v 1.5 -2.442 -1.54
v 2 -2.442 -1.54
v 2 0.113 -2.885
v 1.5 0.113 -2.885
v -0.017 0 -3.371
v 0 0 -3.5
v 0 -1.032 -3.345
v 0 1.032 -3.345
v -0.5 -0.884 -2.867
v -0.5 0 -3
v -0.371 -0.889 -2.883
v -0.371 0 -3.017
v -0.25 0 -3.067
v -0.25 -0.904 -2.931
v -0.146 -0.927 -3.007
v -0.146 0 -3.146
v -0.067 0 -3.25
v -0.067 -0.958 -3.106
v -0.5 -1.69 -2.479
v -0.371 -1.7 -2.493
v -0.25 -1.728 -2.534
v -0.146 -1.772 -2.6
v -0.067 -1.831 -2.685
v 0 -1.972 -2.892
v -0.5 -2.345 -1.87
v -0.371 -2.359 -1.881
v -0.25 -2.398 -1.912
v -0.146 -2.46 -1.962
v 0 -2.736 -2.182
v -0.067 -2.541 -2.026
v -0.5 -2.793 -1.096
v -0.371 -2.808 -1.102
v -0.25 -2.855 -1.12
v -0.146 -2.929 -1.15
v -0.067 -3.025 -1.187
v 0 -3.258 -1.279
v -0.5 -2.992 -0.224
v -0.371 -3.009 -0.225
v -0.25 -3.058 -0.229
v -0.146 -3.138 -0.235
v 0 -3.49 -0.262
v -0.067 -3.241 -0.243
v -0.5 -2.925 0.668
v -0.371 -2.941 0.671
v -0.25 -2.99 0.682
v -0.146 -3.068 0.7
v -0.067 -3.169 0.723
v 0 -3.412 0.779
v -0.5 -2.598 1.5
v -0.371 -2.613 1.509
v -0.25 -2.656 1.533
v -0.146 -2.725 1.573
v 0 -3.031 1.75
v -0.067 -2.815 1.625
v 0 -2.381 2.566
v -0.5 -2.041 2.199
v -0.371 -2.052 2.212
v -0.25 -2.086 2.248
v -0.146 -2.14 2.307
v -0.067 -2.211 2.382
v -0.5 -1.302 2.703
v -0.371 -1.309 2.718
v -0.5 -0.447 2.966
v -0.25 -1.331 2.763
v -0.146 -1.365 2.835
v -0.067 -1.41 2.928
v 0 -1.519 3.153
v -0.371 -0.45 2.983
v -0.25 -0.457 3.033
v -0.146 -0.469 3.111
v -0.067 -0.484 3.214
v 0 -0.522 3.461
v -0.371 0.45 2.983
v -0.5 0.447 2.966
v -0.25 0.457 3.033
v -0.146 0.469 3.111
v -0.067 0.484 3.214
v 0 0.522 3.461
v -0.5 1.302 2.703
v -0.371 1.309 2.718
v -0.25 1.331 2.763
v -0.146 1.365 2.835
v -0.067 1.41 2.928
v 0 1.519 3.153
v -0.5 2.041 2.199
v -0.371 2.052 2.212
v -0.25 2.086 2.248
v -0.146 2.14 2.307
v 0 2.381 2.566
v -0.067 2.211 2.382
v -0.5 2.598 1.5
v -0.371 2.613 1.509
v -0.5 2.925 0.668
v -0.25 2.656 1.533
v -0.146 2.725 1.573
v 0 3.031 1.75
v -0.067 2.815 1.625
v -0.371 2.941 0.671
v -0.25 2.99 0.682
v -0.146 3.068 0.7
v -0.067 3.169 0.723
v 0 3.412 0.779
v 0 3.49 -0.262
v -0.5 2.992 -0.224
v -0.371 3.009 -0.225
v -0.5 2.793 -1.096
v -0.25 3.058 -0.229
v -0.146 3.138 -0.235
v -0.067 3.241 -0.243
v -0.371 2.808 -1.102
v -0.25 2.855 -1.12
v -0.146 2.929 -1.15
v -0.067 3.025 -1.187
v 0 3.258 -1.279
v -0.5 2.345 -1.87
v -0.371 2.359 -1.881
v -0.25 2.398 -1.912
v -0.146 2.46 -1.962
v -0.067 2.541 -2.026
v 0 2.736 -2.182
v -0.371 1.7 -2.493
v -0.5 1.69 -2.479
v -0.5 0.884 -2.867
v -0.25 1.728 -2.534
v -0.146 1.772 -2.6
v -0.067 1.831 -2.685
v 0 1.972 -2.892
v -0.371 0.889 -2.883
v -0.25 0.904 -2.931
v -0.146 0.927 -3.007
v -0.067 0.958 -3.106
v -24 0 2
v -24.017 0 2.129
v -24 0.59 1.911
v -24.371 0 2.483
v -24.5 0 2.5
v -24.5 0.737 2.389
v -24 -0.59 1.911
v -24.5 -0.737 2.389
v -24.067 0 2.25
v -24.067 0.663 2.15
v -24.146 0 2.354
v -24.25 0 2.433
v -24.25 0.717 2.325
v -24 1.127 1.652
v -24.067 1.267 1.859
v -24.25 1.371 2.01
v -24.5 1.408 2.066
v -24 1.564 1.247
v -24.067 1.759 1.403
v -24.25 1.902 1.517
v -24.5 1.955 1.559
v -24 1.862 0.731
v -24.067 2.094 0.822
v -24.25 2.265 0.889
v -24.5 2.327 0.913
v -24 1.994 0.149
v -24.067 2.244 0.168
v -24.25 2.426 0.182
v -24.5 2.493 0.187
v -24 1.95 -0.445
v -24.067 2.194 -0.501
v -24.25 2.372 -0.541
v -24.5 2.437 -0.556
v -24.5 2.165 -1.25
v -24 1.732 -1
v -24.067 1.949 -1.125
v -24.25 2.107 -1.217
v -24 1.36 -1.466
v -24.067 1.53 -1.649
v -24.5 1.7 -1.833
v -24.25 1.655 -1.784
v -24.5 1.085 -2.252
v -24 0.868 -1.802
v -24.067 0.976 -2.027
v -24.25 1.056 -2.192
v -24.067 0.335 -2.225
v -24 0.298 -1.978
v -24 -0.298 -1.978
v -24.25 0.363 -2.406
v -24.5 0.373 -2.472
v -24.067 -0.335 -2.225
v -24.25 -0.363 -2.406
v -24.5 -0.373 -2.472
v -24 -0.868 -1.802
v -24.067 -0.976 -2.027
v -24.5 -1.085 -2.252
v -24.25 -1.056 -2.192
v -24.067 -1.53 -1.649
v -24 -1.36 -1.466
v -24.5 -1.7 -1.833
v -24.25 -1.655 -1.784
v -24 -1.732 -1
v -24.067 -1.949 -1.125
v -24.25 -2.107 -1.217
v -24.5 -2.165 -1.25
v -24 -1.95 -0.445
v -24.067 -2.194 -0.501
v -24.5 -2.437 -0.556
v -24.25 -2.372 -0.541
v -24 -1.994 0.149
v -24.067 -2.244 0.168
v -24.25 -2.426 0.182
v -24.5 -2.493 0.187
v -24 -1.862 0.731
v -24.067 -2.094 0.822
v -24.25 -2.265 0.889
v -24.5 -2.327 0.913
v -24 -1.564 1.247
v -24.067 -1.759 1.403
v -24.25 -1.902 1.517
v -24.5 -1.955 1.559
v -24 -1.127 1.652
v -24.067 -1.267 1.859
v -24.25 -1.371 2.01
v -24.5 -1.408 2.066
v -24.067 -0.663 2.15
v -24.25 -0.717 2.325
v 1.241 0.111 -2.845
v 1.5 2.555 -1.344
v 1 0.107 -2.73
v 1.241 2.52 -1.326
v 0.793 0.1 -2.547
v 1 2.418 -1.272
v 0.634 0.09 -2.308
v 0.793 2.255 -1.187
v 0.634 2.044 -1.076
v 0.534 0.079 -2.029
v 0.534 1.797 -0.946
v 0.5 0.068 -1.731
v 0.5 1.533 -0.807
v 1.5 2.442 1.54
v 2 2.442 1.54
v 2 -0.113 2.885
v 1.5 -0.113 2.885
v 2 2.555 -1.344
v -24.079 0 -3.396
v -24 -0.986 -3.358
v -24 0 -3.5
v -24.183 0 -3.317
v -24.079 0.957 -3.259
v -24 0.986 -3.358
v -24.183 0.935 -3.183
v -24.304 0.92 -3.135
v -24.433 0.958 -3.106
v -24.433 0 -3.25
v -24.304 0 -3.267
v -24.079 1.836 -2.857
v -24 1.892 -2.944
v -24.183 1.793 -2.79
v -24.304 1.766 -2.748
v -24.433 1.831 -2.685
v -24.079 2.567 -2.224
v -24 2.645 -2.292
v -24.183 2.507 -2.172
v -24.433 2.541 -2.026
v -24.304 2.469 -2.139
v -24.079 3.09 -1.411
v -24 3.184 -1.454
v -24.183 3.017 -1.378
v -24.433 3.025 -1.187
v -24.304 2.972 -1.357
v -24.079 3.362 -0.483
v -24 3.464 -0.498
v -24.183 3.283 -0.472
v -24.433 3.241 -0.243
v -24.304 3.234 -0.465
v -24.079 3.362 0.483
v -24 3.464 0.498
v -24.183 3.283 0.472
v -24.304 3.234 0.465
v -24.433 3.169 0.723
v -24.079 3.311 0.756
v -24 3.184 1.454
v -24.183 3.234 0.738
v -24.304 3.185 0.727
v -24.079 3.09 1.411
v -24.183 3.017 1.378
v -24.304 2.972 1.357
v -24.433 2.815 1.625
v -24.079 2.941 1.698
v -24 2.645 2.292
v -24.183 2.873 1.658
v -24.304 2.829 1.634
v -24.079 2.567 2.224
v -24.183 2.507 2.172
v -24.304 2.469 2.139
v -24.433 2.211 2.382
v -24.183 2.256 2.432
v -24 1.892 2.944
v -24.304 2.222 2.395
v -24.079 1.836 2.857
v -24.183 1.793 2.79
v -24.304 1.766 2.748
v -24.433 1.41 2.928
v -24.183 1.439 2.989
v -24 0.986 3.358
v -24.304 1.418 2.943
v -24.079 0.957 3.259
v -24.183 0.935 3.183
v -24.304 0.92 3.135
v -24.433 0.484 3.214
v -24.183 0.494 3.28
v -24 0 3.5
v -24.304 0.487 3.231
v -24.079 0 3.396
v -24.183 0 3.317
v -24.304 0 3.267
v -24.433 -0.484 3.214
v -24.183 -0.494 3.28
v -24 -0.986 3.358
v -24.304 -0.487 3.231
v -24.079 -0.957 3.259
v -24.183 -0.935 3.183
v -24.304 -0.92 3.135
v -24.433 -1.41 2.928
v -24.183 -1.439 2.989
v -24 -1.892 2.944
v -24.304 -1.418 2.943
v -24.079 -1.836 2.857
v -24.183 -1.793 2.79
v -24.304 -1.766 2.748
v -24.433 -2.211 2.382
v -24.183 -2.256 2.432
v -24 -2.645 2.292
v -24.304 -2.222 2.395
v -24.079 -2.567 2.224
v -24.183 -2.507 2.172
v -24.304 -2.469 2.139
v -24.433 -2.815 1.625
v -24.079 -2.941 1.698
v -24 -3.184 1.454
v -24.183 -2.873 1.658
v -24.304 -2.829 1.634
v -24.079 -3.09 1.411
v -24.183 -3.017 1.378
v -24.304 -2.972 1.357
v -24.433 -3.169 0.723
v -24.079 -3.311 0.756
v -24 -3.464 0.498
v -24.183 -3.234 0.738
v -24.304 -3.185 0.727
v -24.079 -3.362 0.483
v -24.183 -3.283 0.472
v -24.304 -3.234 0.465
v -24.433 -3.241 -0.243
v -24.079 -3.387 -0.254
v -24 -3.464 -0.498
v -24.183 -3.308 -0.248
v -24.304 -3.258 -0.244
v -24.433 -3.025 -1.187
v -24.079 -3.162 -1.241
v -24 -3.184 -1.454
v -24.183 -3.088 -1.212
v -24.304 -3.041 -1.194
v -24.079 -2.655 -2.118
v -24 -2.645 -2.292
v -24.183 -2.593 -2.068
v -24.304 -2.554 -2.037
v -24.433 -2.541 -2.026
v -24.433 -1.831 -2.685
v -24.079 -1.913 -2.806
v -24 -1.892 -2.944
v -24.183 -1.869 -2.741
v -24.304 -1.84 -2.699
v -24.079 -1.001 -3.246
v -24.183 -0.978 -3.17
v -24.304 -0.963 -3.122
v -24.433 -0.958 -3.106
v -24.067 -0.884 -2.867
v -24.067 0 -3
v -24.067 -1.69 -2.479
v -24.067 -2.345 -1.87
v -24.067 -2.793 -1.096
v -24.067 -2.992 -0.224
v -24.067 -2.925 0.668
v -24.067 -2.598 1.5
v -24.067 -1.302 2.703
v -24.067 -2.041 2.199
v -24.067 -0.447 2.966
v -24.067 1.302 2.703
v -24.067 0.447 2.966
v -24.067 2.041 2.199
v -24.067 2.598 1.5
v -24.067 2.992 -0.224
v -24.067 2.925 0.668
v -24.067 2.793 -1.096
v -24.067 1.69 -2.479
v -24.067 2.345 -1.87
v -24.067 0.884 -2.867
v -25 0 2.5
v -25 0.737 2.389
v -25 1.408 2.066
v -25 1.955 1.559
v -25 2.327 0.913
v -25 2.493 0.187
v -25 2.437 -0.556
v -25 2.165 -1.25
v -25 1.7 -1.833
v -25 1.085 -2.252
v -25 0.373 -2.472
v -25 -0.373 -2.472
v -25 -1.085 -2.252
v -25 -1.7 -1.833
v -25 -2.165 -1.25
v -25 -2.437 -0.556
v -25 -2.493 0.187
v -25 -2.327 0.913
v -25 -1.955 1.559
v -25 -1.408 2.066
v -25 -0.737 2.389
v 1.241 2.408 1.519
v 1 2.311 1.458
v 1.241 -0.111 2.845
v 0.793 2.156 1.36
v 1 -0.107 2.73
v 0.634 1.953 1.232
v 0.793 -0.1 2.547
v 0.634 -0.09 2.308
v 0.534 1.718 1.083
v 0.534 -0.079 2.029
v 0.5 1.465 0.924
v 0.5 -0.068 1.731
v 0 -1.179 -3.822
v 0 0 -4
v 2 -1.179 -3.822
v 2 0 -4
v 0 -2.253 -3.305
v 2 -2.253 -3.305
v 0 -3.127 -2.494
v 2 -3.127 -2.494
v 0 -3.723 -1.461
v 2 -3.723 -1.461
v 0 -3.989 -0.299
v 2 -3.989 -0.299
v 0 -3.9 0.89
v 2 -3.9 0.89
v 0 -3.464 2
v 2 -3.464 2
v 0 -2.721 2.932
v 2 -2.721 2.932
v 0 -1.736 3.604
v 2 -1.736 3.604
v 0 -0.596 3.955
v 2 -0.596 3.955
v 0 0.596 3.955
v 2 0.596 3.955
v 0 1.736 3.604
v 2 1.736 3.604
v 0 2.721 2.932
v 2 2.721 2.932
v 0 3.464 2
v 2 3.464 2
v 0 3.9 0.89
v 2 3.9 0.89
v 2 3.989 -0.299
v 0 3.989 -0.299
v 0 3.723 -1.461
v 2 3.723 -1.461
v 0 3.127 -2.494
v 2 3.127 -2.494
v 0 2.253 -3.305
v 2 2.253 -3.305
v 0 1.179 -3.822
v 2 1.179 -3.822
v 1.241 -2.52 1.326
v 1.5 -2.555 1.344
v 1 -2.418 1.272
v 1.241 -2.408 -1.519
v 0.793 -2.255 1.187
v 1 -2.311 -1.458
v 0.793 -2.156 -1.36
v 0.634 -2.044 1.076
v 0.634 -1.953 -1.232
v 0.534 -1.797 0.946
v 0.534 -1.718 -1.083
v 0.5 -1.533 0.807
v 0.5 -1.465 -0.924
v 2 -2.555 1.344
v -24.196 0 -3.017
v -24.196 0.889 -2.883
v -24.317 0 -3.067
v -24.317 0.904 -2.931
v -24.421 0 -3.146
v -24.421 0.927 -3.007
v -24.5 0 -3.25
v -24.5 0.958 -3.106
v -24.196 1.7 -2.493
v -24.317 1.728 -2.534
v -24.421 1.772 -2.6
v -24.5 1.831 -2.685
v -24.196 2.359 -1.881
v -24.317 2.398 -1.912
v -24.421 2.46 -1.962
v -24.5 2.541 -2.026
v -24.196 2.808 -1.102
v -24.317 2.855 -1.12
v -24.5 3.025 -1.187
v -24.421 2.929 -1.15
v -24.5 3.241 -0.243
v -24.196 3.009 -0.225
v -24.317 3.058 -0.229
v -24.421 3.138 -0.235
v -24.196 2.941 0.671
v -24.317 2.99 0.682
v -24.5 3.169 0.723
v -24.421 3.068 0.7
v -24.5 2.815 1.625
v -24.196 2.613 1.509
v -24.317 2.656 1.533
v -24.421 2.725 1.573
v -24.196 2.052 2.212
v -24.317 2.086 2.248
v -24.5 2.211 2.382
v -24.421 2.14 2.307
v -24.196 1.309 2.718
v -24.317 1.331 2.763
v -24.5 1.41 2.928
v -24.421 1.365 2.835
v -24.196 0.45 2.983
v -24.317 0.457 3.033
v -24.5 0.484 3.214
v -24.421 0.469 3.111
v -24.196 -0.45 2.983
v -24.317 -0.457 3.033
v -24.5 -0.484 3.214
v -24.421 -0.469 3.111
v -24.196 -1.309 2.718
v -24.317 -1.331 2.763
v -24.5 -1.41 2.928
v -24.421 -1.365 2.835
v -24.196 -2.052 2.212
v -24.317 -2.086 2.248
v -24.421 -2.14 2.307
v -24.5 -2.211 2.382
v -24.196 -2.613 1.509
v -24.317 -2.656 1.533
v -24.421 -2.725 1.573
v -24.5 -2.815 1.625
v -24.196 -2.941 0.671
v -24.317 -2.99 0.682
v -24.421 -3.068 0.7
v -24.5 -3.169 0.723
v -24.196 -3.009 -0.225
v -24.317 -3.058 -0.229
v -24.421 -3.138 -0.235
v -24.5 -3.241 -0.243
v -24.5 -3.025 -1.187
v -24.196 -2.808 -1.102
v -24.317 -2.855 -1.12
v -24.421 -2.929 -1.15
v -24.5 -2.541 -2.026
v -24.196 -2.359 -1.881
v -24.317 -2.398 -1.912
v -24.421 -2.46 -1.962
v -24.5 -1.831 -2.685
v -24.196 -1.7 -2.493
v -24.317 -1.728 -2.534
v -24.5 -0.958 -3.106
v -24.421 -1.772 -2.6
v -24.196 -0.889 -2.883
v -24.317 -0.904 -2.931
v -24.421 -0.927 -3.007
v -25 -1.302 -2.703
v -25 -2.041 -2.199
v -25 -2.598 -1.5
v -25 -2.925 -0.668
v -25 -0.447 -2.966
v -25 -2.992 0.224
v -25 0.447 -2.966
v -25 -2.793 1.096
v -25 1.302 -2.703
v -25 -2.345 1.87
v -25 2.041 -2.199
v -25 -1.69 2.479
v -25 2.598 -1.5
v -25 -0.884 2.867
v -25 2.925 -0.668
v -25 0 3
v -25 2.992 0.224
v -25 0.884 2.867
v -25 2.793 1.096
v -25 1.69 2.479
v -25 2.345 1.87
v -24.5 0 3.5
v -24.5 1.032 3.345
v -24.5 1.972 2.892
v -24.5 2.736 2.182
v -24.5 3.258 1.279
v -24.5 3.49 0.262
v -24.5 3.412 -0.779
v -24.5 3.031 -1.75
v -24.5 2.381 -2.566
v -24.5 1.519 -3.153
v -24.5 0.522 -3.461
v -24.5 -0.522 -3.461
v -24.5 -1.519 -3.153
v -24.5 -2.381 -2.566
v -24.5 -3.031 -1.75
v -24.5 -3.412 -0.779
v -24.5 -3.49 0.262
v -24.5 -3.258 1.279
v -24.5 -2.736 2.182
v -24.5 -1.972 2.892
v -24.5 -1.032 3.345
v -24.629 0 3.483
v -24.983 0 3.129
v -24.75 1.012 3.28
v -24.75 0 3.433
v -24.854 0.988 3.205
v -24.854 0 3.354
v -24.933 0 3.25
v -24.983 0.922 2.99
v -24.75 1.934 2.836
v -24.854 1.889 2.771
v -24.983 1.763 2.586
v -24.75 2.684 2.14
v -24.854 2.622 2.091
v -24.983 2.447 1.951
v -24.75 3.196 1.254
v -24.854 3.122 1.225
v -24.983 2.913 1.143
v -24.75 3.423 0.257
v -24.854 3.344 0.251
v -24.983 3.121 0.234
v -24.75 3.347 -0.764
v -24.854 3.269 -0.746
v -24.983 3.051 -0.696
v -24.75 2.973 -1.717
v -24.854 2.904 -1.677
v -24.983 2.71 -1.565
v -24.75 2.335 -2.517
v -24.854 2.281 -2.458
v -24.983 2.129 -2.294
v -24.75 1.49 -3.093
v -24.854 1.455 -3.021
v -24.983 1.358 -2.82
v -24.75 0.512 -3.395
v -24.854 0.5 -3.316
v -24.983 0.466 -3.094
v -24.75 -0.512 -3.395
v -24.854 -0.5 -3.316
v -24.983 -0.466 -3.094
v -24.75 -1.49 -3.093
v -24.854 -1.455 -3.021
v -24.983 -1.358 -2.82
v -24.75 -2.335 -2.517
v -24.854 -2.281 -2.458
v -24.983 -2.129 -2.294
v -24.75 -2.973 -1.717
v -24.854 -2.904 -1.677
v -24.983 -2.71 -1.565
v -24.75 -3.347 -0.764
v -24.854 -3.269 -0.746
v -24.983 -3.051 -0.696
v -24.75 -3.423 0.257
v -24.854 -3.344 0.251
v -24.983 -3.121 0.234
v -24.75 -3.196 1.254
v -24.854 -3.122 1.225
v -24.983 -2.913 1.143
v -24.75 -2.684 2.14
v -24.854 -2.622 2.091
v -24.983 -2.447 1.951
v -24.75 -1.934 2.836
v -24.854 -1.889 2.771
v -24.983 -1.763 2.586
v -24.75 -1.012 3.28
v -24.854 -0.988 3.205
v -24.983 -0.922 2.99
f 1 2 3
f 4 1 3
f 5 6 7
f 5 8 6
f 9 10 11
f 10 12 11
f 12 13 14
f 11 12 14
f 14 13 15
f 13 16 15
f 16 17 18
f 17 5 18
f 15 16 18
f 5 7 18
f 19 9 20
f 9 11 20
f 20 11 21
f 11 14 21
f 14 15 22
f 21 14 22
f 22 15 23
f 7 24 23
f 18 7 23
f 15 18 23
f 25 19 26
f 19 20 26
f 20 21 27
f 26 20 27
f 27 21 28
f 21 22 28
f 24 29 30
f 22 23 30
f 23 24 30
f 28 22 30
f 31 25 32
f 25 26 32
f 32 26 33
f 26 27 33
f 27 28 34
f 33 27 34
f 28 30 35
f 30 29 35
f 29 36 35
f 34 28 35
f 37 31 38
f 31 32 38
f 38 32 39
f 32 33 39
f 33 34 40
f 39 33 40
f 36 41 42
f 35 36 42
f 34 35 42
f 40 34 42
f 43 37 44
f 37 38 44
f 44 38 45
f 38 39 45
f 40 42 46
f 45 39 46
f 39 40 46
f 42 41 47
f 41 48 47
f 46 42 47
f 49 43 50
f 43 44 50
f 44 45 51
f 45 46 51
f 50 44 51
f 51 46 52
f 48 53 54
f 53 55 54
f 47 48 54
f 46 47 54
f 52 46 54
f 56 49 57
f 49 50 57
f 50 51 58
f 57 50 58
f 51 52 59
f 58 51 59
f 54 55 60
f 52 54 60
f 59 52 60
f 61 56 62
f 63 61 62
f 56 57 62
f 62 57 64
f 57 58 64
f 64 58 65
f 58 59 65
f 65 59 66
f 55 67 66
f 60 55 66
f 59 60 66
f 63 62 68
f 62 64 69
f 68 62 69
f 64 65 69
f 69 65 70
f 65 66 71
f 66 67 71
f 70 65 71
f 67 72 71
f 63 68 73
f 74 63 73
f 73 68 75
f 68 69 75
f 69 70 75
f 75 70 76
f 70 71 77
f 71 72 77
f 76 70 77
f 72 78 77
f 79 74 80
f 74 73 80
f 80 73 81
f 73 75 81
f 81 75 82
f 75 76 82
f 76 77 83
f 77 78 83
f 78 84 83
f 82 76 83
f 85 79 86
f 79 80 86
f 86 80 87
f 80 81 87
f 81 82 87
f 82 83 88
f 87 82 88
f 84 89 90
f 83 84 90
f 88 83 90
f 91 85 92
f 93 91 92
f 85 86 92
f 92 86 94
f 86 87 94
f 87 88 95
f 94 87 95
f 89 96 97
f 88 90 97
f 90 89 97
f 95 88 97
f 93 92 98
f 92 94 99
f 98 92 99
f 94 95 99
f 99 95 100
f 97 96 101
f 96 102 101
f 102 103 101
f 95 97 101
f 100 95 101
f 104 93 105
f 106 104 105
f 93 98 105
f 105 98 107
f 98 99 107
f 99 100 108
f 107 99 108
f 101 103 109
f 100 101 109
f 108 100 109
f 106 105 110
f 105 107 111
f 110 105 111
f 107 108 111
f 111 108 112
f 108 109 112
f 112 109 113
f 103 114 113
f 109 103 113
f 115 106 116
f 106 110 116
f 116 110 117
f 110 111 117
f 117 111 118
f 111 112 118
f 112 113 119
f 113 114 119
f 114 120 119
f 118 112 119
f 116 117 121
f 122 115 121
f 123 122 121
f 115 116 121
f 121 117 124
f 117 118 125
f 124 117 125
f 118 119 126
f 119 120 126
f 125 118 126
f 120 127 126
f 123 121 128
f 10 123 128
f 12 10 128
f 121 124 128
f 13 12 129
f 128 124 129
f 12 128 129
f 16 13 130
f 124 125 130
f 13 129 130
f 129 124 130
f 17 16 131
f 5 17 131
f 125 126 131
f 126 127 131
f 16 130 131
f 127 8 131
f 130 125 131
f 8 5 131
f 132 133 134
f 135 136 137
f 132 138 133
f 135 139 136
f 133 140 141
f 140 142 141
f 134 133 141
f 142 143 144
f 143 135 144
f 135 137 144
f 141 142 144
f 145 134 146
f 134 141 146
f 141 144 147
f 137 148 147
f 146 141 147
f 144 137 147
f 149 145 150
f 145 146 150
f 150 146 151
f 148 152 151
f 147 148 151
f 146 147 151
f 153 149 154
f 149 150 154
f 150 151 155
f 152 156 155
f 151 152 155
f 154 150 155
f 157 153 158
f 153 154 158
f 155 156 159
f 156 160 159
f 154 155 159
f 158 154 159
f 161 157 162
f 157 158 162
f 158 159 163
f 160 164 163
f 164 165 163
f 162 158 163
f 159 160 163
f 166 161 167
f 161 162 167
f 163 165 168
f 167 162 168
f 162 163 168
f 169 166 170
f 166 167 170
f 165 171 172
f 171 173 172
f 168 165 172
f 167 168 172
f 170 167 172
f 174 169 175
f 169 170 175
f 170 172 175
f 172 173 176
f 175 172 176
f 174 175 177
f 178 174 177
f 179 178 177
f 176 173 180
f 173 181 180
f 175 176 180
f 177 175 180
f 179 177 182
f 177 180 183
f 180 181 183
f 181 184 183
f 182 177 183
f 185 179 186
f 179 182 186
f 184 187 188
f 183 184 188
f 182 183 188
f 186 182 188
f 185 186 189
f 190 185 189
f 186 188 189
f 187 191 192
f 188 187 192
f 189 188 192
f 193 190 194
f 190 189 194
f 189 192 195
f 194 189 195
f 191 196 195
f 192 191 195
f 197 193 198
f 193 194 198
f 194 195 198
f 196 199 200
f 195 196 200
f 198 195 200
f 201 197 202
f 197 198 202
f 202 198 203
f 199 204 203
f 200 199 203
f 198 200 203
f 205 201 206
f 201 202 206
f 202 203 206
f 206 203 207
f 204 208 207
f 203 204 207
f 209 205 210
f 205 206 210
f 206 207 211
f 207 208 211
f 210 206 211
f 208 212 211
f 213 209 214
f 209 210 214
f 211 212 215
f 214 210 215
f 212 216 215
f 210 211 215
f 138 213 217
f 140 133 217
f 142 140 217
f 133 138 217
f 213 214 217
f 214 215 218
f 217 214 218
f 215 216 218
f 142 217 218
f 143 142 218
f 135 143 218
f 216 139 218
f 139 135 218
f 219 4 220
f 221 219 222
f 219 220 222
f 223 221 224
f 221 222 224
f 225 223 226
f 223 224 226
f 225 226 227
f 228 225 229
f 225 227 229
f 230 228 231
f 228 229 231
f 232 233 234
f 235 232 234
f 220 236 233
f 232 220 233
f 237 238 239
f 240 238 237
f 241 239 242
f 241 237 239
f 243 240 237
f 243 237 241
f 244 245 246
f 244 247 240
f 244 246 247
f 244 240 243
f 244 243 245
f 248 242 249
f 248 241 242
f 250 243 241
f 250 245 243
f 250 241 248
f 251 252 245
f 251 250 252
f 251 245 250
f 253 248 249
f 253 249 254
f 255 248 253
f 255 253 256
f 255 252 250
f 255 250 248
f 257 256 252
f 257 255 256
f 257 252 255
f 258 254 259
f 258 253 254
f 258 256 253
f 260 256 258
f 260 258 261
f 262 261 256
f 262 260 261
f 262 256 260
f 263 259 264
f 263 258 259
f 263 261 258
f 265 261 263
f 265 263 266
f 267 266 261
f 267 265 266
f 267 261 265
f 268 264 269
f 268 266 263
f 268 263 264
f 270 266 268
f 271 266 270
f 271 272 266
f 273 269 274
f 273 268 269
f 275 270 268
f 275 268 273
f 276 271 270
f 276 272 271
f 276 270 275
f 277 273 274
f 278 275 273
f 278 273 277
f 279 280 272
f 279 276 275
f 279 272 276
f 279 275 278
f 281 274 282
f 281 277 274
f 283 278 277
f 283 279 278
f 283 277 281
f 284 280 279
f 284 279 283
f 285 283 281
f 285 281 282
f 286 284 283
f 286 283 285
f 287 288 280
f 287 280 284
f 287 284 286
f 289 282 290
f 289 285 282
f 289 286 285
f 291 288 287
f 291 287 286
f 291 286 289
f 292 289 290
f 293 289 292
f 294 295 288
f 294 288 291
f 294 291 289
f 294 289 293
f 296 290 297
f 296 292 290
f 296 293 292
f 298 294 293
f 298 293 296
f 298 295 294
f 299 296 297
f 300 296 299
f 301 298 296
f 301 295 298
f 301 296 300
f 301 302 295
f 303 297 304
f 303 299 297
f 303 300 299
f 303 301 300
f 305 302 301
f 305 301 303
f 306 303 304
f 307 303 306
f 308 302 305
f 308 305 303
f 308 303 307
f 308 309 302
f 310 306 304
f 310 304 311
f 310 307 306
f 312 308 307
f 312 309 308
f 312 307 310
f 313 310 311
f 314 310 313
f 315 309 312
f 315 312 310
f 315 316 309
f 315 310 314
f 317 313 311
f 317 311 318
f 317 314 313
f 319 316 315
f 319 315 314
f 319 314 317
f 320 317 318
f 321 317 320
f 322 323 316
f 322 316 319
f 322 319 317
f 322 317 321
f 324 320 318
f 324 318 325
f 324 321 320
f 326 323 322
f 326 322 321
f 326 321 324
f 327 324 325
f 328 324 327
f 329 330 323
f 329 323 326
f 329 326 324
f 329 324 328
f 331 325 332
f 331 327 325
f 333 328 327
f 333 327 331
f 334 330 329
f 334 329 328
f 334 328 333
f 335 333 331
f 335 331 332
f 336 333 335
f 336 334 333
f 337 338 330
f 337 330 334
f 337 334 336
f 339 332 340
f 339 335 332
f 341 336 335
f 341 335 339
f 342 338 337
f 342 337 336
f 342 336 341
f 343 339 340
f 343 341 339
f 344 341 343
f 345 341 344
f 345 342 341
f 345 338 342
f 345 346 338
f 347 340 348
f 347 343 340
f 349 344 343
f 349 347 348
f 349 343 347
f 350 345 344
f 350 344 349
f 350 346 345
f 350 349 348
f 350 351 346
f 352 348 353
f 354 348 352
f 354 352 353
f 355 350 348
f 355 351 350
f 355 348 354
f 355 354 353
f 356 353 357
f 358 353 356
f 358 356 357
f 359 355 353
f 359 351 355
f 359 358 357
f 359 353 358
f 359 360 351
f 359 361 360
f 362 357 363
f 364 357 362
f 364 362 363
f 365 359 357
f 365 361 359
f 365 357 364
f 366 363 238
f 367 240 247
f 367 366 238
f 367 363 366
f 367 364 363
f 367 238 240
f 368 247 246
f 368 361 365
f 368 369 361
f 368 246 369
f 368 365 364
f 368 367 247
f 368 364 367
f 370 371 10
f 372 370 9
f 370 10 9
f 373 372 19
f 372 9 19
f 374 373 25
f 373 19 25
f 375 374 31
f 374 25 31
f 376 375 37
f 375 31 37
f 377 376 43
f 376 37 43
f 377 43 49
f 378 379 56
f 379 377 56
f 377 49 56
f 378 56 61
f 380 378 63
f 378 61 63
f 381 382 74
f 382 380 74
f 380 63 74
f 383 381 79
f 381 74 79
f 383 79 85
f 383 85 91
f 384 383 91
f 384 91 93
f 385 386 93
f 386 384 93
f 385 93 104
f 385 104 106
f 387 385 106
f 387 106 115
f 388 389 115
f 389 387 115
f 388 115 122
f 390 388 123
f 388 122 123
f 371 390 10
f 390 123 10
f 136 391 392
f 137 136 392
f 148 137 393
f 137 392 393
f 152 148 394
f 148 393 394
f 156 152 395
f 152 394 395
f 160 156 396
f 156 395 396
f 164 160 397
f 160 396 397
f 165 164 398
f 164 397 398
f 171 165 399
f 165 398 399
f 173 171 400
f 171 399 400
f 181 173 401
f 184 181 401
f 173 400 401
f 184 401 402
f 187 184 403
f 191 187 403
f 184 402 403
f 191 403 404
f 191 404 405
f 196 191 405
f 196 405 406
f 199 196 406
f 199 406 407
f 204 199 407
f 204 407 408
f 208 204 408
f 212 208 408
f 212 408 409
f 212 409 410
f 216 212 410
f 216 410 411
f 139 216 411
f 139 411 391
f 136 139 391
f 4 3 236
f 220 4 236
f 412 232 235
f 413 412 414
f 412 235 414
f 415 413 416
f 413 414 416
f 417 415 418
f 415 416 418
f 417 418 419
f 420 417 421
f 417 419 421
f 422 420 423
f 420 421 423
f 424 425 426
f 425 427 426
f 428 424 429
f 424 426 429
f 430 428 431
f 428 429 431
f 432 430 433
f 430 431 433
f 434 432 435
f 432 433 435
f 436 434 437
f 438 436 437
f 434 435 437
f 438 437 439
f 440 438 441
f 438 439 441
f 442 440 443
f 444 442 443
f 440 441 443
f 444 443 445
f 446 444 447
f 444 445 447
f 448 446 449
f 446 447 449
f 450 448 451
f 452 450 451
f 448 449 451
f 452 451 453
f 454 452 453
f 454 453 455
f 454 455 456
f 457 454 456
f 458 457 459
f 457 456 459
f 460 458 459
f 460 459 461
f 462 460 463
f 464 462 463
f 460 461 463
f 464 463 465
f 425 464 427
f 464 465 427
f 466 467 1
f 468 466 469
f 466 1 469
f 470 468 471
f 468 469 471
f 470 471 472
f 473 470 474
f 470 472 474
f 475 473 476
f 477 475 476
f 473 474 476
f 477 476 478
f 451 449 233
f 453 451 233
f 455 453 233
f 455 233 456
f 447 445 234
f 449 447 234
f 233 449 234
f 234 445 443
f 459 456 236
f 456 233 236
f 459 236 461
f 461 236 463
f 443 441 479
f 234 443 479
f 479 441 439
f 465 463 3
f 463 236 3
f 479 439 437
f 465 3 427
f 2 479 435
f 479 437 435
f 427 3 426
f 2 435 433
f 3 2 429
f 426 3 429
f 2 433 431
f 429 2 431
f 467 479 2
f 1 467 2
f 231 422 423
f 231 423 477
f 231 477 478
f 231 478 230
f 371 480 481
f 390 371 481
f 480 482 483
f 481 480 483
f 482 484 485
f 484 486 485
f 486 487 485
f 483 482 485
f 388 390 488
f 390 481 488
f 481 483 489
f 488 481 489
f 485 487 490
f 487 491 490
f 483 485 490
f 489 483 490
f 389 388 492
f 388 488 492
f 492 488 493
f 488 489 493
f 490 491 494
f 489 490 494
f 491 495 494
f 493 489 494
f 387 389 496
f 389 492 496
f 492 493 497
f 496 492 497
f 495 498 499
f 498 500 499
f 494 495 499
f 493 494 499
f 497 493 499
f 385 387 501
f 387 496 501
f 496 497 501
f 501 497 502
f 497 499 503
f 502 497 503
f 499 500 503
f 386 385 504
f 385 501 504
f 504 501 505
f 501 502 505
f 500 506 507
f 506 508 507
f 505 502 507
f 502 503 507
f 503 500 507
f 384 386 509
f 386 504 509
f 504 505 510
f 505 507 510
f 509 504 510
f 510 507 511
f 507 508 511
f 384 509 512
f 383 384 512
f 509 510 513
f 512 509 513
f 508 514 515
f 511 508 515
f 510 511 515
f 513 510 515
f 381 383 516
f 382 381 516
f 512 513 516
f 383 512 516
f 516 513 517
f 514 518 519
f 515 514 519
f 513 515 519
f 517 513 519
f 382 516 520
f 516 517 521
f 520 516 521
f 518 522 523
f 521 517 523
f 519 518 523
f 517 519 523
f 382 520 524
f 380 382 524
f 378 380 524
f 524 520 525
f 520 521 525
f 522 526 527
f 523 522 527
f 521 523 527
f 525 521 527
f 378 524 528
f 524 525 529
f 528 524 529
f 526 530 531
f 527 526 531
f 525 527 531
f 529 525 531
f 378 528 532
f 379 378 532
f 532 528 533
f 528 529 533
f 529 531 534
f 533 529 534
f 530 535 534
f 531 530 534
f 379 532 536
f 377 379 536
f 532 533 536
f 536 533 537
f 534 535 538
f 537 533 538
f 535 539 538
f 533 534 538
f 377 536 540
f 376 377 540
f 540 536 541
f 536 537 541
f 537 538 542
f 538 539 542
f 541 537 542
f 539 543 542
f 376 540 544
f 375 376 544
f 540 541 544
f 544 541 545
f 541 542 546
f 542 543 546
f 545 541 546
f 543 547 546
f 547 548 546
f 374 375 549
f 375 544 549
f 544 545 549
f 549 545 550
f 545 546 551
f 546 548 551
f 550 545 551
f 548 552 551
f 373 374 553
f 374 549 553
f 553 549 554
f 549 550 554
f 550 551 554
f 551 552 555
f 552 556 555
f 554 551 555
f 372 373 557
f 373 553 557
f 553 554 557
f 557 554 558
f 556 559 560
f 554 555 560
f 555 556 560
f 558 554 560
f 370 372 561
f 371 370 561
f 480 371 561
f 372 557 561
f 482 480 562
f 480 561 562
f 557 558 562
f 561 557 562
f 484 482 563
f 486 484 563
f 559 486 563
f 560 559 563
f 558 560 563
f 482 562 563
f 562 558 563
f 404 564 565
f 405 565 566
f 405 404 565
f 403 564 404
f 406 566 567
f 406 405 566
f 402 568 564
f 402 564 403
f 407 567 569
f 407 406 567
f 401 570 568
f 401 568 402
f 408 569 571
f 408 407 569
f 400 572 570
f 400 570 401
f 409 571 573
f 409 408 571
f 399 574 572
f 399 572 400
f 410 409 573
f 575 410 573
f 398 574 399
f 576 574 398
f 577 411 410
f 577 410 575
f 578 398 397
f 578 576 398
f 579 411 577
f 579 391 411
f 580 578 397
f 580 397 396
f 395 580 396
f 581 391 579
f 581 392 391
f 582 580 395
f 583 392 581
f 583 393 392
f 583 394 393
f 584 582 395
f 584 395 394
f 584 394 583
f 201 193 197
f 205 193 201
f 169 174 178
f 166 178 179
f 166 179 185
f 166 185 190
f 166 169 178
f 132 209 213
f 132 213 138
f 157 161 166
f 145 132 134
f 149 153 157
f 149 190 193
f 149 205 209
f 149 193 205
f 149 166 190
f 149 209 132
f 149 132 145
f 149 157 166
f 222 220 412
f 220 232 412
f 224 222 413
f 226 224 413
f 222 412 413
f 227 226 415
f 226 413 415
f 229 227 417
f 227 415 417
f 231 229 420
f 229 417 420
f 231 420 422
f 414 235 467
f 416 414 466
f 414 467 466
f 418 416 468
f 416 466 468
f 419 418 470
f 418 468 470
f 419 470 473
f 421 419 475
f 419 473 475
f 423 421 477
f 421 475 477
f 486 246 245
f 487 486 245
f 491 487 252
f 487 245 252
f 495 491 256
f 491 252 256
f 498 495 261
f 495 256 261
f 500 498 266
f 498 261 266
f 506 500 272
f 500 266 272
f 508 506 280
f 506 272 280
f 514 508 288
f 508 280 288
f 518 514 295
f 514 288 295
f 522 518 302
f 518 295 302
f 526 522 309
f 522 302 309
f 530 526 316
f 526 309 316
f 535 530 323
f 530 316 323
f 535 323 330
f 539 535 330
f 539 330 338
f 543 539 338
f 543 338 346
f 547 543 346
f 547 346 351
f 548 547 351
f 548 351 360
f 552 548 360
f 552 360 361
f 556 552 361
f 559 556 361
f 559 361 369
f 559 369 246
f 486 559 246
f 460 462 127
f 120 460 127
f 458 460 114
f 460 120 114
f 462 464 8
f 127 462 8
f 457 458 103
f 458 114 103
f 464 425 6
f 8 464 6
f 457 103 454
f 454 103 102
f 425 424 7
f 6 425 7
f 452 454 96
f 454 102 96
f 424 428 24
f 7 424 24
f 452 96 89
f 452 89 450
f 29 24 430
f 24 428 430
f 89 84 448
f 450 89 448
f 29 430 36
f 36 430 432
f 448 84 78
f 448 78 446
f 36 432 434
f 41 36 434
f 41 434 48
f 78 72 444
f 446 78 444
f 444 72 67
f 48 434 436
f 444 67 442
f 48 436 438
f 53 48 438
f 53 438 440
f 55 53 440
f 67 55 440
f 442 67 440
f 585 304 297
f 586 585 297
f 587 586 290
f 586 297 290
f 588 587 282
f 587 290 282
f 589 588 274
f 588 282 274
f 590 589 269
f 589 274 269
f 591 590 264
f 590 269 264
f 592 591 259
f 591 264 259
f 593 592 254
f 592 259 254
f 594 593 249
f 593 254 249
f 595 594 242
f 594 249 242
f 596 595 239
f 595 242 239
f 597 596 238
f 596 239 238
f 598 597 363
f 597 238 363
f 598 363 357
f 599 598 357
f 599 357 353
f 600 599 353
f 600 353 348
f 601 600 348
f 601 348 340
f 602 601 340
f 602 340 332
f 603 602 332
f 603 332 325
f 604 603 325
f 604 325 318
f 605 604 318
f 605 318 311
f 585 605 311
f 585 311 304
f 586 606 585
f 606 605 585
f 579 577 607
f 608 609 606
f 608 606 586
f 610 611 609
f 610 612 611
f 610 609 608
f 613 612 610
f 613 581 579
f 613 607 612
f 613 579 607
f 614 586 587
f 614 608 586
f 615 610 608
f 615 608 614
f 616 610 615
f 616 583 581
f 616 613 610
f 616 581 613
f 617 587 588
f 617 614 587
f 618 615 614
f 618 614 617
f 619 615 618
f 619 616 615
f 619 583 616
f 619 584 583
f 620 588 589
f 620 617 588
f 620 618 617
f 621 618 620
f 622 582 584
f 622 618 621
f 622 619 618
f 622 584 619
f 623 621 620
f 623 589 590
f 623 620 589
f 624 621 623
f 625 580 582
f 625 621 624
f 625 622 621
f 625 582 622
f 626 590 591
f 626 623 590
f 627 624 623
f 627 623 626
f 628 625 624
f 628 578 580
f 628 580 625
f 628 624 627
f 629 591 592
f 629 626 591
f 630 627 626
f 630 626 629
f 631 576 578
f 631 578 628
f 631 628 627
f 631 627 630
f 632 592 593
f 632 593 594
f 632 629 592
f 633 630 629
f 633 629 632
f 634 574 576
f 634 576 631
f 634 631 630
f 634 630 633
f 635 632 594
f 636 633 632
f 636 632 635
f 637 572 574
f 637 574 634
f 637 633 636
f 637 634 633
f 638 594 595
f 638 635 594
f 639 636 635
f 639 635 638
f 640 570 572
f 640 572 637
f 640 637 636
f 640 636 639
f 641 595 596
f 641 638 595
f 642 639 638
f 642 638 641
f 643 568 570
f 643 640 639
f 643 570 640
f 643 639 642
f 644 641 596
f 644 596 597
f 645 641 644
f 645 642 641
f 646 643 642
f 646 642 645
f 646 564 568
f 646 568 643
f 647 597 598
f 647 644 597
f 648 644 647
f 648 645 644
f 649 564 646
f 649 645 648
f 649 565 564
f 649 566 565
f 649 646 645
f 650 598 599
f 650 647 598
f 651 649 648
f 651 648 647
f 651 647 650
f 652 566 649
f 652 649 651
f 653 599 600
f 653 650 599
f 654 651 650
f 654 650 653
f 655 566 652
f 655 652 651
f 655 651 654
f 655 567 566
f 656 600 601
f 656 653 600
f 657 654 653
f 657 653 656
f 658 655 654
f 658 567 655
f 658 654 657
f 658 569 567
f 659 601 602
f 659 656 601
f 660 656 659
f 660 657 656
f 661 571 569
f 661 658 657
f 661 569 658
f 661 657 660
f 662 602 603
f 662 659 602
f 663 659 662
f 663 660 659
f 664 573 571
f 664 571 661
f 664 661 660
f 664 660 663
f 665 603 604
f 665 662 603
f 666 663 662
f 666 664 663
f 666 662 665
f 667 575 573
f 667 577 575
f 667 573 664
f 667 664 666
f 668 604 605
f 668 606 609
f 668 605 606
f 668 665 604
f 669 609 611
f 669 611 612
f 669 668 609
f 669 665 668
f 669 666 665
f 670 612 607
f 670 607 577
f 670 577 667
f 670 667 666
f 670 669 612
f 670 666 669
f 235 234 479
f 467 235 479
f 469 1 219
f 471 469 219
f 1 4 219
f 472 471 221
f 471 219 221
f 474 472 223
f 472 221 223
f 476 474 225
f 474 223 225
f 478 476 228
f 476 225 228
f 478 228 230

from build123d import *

# Parameters (mm, degrees)
ESBO_O4_R                = 3
RESSALTO_EXTRUS_O1_DEPTH = 24
CORTE_EXTRUS_O1_DEPTH    = 1.5
ESBO_O6_R                = 3.5
RESSALTO_EXTRUS_O2_DEPTH = 1
ESBO_O7_R                = 2.5
CORTE_EXTRUS_O2_DEPTH    = 1
ESBO_O8_R                = 3.25
ESBO_O8_R_2              = 3.0000000000000004
CORTE_EXTRUS_O3_DEPTH    = 0.5
FILETE2_R                = 0.5
FILETE3_R                = 1


with BuildPart() as part:
    # Esboço1 → Revolução3 (revolve)
    with BuildSketch(Plane.XY, mode=Mode.PRIVATE) as revolu_o3_sk:
        Polygon((0, 0), (4.3e-16, 4), (2.0000000000000004, 4), (2, 0), align=None)
    revolve(revolu_o3_sk.sketch.rotate(Axis((2, 0, 0), (-1, 0, 0)), 90), axis=Axis((2, 0, 0), (-1, 0, 0)))

    # Esboço4 → Ressalto-extrusão1 (add)
    with BuildSketch(Plane.ZY):
        with Locations(Location((0, 0, 0), (0, 0, 180))):
            Circle(ESBO_O4_R)
    extrude(amount=RESSALTO_EXTRUS_O1_DEPTH)

    # Esboço5 → Corte-extrusão1 (cut)
    with BuildSketch(Plane(origin=(2, 0, 0), x_dir=(0, 0, -1), z_dir=(1, 0, 0))):
        Polygon((1.3444941418500793, 2.554538869515231), (-1.5400484850299316, 2.441635516839142), (-2.88454262688001, -0.11290335267608817), (-1.3444941418500784, -2.5545388695152305), (1.540048485029931, -2.4416355168391424), (2.8845426268800107, 0.11290335267608934), align=None)
    extrude(amount=-CORTE_EXTRUS_O1_DEPTH, mode=Mode.SUBTRACT)

    # Esboço6 → Ressalto-extrusão2 (add)
    with BuildSketch(Plane.ZY.offset(24)):
        Circle(ESBO_O6_R)
    extrude(amount=RESSALTO_EXTRUS_O2_DEPTH)

    # Esboço7 → Corte-extrusão2 (cut)
    with BuildSketch(Plane.ZY.offset(25)):
        Circle(ESBO_O7_R)
    extrude(amount=-CORTE_EXTRUS_O2_DEPTH, mode=Mode.SUBTRACT)

    # Esboço8 → Corte-extrusão3 (cut)
    with BuildSketch(Plane(origin=(-24, 0, 0), x_dir=(0, 0, -1), z_dir=(1, 0, 0))):
        Circle(ESBO_O8_R)
        Circle(ESBO_O8_R_2, mode=Mode.SUBTRACT)
    extrude(amount=-CORTE_EXTRUS_O3_DEPTH, mode=Mode.SUBTRACT)

    # Filete2
    # the kernel refuses this fillet: 0.5 mm, written as the material it adds along each edge
    with BuildSketch(Plane(origin=(-24, 0, 0), x_dir=(0, 0, 1), z_dir=(0, -1, 0))) as filete2_piece_1:
        with BuildLine():
            CenterArc((2.5 - FILETE2_R, FILETE2_R), FILETE2_R, 270, 90)
            Line((2.5 - FILETE2_R, 0), (2.5 - FILETE2_R, -FILETE2_R * 0.02))
            Line((2.5 - FILETE2_R, -FILETE2_R * 0.02), (2.5 + FILETE2_R * 0.02, -FILETE2_R * 0.02))
            Line((2.5 + FILETE2_R * 0.02, -FILETE2_R * 0.02), (2.5 + FILETE2_R * 0.02, FILETE2_R))
            Line((2.5 + FILETE2_R * 0.02, FILETE2_R), (2.5, FILETE2_R))
        make_face()
    revolve(axis=Axis((-24, 0, 0), (-1, 0, 0)))
    with BuildSketch(Plane(origin=(-24.5, 0, 0), x_dir=(0, 0, -1), z_dir=(0, -1, 0))) as filete2_piece_2:
        with BuildLine():
            CenterArc((3.5000000000000004, 0.4330127018922383), FILETE2_R, 180, 60.00000000000102)
            Line((3.0000000000000004, 0.4330127018922383), (2.9900000000000007, 0.4330127018922383))
            Line((2.9900000000000007, 0.4330127018922383), (2.9900000000000007, 0))
            Line((2.9900000000000007, 0), (3.0000000000000004, -0.01000000000000156))
            ThreePointArc((3.0000000000000004, -0.01000000000000156), (3.1250000000000044, -0.01000000000000156), (3.2450000000000085, -0.00866025403783155))
            Line((3.2450000000000085, -0.00866025403783155), (3.2500000000000084, 1.421e-14))
        make_face()
    revolve(axis=Axis((-24.5, 0, 0), (1, 0, 0)))
    with BuildSketch(Plane(origin=(0, 0, 0), x_dir=(0, 1.2e-16, -1), z_dir=(0, 1, 1.2e-16))) as filete2_piece_3:
        with BuildLine():
            CenterArc((3 + FILETE2_R, FILETE2_R), FILETE2_R, 180, 90)
            Line((3 + FILETE2_R, -6e-17), (3 + FILETE2_R, -FILETE2_R * 0.02))
            Line((3 + FILETE2_R, -FILETE2_R * 0.02), (3 - FILETE2_R * 0.02, -FILETE2_R * 0.02))
            Line((3 - FILETE2_R * 0.02, -FILETE2_R * 0.02), (3 - FILETE2_R * 0.02, FILETE2_R))
            Line((3 - FILETE2_R * 0.02, FILETE2_R), (3, FILETE2_R))
        make_face()
    revolve(axis=Axis((0, 0, 0), (-1, 0, 0)))
    # the kernel refuses this fillet: 0.5 mm, written as the material it takes off along each edge
    with BuildSketch(Plane(origin=(-25, 0, 0), x_dir=(0, 0, 1), z_dir=(0, -1, 0))) as filete2_2_piece_1:
        with BuildLine():
            CenterArc((3.5 - FILETE2_R, -FILETE2_R), FILETE2_R, 0, 90)
            Line((3.5 - FILETE2_R, 0), (3.5 - FILETE2_R, FILETE2_R * 0.02))
            Line((3.5 - FILETE2_R, FILETE2_R * 0.02), (3.5 + FILETE2_R * 0.02, FILETE2_R * 0.02))
            Line((3.5 + FILETE2_R * 0.02, FILETE2_R * 0.02), (3.5 + FILETE2_R * 0.02, -FILETE2_R))
            Line((3.5 + FILETE2_R * 0.02, -FILETE2_R), (3.5, -FILETE2_R))
        make_face()
    revolve(axis=Axis((-25, 0, 0), (-1, 0, 0)), mode=Mode.SUBTRACT)
    with BuildSketch(Plane(origin=(-24, 0, 0), x_dir=(0, 0, -1), z_dir=(0, -1, 0))) as filete2_2_piece_2:
        with BuildLine():
            CenterArc((3.75, -0.4330127018922454), FILETE2_R, 119.99999999999864, 60.000000000001364)
            Line((3.25, -0.4330127018922454), (3.24, -0.4330127018922454))
            Line((3.24, -0.4330127018922454), (3.24, 0))
            Line((3.24, 0), (3.25, 0.01000000000000156))
            ThreePointArc((3.25, 0.01000000000000156), (3.3750000000000053, 0.01000000000000156), (3.495000000000011, 0.00866025403782444))
            Line((3.495000000000011, 0.00866025403782444), (3.500000000000011, -2.132e-14))
        make_face()
    revolve(axis=Axis((-24, 0, 0), (1, 0, 0)), mode=Mode.SUBTRACT)

    # Filete3
    filete3_edges = [part.edges().sort_by_distance(p)[0] for p in [
        (0.5, 1.3337211110956604, -2.114518384365045),
        (0.5, -1.1643660820815265, -2.212295555954971),
        (0.5, -2.498087193177186, -0.09777717158992649),
        (0.5, -1.3337211110956593, 2.114518384365044),
        (0.5, 1.164366082081527, 2.212295555954971),
        (0.5, 2.498087193177186, 0.09777717158992627),
    ]]
    fillet(filete3_edges, radius=FILETE3_R)


solid = part.part
